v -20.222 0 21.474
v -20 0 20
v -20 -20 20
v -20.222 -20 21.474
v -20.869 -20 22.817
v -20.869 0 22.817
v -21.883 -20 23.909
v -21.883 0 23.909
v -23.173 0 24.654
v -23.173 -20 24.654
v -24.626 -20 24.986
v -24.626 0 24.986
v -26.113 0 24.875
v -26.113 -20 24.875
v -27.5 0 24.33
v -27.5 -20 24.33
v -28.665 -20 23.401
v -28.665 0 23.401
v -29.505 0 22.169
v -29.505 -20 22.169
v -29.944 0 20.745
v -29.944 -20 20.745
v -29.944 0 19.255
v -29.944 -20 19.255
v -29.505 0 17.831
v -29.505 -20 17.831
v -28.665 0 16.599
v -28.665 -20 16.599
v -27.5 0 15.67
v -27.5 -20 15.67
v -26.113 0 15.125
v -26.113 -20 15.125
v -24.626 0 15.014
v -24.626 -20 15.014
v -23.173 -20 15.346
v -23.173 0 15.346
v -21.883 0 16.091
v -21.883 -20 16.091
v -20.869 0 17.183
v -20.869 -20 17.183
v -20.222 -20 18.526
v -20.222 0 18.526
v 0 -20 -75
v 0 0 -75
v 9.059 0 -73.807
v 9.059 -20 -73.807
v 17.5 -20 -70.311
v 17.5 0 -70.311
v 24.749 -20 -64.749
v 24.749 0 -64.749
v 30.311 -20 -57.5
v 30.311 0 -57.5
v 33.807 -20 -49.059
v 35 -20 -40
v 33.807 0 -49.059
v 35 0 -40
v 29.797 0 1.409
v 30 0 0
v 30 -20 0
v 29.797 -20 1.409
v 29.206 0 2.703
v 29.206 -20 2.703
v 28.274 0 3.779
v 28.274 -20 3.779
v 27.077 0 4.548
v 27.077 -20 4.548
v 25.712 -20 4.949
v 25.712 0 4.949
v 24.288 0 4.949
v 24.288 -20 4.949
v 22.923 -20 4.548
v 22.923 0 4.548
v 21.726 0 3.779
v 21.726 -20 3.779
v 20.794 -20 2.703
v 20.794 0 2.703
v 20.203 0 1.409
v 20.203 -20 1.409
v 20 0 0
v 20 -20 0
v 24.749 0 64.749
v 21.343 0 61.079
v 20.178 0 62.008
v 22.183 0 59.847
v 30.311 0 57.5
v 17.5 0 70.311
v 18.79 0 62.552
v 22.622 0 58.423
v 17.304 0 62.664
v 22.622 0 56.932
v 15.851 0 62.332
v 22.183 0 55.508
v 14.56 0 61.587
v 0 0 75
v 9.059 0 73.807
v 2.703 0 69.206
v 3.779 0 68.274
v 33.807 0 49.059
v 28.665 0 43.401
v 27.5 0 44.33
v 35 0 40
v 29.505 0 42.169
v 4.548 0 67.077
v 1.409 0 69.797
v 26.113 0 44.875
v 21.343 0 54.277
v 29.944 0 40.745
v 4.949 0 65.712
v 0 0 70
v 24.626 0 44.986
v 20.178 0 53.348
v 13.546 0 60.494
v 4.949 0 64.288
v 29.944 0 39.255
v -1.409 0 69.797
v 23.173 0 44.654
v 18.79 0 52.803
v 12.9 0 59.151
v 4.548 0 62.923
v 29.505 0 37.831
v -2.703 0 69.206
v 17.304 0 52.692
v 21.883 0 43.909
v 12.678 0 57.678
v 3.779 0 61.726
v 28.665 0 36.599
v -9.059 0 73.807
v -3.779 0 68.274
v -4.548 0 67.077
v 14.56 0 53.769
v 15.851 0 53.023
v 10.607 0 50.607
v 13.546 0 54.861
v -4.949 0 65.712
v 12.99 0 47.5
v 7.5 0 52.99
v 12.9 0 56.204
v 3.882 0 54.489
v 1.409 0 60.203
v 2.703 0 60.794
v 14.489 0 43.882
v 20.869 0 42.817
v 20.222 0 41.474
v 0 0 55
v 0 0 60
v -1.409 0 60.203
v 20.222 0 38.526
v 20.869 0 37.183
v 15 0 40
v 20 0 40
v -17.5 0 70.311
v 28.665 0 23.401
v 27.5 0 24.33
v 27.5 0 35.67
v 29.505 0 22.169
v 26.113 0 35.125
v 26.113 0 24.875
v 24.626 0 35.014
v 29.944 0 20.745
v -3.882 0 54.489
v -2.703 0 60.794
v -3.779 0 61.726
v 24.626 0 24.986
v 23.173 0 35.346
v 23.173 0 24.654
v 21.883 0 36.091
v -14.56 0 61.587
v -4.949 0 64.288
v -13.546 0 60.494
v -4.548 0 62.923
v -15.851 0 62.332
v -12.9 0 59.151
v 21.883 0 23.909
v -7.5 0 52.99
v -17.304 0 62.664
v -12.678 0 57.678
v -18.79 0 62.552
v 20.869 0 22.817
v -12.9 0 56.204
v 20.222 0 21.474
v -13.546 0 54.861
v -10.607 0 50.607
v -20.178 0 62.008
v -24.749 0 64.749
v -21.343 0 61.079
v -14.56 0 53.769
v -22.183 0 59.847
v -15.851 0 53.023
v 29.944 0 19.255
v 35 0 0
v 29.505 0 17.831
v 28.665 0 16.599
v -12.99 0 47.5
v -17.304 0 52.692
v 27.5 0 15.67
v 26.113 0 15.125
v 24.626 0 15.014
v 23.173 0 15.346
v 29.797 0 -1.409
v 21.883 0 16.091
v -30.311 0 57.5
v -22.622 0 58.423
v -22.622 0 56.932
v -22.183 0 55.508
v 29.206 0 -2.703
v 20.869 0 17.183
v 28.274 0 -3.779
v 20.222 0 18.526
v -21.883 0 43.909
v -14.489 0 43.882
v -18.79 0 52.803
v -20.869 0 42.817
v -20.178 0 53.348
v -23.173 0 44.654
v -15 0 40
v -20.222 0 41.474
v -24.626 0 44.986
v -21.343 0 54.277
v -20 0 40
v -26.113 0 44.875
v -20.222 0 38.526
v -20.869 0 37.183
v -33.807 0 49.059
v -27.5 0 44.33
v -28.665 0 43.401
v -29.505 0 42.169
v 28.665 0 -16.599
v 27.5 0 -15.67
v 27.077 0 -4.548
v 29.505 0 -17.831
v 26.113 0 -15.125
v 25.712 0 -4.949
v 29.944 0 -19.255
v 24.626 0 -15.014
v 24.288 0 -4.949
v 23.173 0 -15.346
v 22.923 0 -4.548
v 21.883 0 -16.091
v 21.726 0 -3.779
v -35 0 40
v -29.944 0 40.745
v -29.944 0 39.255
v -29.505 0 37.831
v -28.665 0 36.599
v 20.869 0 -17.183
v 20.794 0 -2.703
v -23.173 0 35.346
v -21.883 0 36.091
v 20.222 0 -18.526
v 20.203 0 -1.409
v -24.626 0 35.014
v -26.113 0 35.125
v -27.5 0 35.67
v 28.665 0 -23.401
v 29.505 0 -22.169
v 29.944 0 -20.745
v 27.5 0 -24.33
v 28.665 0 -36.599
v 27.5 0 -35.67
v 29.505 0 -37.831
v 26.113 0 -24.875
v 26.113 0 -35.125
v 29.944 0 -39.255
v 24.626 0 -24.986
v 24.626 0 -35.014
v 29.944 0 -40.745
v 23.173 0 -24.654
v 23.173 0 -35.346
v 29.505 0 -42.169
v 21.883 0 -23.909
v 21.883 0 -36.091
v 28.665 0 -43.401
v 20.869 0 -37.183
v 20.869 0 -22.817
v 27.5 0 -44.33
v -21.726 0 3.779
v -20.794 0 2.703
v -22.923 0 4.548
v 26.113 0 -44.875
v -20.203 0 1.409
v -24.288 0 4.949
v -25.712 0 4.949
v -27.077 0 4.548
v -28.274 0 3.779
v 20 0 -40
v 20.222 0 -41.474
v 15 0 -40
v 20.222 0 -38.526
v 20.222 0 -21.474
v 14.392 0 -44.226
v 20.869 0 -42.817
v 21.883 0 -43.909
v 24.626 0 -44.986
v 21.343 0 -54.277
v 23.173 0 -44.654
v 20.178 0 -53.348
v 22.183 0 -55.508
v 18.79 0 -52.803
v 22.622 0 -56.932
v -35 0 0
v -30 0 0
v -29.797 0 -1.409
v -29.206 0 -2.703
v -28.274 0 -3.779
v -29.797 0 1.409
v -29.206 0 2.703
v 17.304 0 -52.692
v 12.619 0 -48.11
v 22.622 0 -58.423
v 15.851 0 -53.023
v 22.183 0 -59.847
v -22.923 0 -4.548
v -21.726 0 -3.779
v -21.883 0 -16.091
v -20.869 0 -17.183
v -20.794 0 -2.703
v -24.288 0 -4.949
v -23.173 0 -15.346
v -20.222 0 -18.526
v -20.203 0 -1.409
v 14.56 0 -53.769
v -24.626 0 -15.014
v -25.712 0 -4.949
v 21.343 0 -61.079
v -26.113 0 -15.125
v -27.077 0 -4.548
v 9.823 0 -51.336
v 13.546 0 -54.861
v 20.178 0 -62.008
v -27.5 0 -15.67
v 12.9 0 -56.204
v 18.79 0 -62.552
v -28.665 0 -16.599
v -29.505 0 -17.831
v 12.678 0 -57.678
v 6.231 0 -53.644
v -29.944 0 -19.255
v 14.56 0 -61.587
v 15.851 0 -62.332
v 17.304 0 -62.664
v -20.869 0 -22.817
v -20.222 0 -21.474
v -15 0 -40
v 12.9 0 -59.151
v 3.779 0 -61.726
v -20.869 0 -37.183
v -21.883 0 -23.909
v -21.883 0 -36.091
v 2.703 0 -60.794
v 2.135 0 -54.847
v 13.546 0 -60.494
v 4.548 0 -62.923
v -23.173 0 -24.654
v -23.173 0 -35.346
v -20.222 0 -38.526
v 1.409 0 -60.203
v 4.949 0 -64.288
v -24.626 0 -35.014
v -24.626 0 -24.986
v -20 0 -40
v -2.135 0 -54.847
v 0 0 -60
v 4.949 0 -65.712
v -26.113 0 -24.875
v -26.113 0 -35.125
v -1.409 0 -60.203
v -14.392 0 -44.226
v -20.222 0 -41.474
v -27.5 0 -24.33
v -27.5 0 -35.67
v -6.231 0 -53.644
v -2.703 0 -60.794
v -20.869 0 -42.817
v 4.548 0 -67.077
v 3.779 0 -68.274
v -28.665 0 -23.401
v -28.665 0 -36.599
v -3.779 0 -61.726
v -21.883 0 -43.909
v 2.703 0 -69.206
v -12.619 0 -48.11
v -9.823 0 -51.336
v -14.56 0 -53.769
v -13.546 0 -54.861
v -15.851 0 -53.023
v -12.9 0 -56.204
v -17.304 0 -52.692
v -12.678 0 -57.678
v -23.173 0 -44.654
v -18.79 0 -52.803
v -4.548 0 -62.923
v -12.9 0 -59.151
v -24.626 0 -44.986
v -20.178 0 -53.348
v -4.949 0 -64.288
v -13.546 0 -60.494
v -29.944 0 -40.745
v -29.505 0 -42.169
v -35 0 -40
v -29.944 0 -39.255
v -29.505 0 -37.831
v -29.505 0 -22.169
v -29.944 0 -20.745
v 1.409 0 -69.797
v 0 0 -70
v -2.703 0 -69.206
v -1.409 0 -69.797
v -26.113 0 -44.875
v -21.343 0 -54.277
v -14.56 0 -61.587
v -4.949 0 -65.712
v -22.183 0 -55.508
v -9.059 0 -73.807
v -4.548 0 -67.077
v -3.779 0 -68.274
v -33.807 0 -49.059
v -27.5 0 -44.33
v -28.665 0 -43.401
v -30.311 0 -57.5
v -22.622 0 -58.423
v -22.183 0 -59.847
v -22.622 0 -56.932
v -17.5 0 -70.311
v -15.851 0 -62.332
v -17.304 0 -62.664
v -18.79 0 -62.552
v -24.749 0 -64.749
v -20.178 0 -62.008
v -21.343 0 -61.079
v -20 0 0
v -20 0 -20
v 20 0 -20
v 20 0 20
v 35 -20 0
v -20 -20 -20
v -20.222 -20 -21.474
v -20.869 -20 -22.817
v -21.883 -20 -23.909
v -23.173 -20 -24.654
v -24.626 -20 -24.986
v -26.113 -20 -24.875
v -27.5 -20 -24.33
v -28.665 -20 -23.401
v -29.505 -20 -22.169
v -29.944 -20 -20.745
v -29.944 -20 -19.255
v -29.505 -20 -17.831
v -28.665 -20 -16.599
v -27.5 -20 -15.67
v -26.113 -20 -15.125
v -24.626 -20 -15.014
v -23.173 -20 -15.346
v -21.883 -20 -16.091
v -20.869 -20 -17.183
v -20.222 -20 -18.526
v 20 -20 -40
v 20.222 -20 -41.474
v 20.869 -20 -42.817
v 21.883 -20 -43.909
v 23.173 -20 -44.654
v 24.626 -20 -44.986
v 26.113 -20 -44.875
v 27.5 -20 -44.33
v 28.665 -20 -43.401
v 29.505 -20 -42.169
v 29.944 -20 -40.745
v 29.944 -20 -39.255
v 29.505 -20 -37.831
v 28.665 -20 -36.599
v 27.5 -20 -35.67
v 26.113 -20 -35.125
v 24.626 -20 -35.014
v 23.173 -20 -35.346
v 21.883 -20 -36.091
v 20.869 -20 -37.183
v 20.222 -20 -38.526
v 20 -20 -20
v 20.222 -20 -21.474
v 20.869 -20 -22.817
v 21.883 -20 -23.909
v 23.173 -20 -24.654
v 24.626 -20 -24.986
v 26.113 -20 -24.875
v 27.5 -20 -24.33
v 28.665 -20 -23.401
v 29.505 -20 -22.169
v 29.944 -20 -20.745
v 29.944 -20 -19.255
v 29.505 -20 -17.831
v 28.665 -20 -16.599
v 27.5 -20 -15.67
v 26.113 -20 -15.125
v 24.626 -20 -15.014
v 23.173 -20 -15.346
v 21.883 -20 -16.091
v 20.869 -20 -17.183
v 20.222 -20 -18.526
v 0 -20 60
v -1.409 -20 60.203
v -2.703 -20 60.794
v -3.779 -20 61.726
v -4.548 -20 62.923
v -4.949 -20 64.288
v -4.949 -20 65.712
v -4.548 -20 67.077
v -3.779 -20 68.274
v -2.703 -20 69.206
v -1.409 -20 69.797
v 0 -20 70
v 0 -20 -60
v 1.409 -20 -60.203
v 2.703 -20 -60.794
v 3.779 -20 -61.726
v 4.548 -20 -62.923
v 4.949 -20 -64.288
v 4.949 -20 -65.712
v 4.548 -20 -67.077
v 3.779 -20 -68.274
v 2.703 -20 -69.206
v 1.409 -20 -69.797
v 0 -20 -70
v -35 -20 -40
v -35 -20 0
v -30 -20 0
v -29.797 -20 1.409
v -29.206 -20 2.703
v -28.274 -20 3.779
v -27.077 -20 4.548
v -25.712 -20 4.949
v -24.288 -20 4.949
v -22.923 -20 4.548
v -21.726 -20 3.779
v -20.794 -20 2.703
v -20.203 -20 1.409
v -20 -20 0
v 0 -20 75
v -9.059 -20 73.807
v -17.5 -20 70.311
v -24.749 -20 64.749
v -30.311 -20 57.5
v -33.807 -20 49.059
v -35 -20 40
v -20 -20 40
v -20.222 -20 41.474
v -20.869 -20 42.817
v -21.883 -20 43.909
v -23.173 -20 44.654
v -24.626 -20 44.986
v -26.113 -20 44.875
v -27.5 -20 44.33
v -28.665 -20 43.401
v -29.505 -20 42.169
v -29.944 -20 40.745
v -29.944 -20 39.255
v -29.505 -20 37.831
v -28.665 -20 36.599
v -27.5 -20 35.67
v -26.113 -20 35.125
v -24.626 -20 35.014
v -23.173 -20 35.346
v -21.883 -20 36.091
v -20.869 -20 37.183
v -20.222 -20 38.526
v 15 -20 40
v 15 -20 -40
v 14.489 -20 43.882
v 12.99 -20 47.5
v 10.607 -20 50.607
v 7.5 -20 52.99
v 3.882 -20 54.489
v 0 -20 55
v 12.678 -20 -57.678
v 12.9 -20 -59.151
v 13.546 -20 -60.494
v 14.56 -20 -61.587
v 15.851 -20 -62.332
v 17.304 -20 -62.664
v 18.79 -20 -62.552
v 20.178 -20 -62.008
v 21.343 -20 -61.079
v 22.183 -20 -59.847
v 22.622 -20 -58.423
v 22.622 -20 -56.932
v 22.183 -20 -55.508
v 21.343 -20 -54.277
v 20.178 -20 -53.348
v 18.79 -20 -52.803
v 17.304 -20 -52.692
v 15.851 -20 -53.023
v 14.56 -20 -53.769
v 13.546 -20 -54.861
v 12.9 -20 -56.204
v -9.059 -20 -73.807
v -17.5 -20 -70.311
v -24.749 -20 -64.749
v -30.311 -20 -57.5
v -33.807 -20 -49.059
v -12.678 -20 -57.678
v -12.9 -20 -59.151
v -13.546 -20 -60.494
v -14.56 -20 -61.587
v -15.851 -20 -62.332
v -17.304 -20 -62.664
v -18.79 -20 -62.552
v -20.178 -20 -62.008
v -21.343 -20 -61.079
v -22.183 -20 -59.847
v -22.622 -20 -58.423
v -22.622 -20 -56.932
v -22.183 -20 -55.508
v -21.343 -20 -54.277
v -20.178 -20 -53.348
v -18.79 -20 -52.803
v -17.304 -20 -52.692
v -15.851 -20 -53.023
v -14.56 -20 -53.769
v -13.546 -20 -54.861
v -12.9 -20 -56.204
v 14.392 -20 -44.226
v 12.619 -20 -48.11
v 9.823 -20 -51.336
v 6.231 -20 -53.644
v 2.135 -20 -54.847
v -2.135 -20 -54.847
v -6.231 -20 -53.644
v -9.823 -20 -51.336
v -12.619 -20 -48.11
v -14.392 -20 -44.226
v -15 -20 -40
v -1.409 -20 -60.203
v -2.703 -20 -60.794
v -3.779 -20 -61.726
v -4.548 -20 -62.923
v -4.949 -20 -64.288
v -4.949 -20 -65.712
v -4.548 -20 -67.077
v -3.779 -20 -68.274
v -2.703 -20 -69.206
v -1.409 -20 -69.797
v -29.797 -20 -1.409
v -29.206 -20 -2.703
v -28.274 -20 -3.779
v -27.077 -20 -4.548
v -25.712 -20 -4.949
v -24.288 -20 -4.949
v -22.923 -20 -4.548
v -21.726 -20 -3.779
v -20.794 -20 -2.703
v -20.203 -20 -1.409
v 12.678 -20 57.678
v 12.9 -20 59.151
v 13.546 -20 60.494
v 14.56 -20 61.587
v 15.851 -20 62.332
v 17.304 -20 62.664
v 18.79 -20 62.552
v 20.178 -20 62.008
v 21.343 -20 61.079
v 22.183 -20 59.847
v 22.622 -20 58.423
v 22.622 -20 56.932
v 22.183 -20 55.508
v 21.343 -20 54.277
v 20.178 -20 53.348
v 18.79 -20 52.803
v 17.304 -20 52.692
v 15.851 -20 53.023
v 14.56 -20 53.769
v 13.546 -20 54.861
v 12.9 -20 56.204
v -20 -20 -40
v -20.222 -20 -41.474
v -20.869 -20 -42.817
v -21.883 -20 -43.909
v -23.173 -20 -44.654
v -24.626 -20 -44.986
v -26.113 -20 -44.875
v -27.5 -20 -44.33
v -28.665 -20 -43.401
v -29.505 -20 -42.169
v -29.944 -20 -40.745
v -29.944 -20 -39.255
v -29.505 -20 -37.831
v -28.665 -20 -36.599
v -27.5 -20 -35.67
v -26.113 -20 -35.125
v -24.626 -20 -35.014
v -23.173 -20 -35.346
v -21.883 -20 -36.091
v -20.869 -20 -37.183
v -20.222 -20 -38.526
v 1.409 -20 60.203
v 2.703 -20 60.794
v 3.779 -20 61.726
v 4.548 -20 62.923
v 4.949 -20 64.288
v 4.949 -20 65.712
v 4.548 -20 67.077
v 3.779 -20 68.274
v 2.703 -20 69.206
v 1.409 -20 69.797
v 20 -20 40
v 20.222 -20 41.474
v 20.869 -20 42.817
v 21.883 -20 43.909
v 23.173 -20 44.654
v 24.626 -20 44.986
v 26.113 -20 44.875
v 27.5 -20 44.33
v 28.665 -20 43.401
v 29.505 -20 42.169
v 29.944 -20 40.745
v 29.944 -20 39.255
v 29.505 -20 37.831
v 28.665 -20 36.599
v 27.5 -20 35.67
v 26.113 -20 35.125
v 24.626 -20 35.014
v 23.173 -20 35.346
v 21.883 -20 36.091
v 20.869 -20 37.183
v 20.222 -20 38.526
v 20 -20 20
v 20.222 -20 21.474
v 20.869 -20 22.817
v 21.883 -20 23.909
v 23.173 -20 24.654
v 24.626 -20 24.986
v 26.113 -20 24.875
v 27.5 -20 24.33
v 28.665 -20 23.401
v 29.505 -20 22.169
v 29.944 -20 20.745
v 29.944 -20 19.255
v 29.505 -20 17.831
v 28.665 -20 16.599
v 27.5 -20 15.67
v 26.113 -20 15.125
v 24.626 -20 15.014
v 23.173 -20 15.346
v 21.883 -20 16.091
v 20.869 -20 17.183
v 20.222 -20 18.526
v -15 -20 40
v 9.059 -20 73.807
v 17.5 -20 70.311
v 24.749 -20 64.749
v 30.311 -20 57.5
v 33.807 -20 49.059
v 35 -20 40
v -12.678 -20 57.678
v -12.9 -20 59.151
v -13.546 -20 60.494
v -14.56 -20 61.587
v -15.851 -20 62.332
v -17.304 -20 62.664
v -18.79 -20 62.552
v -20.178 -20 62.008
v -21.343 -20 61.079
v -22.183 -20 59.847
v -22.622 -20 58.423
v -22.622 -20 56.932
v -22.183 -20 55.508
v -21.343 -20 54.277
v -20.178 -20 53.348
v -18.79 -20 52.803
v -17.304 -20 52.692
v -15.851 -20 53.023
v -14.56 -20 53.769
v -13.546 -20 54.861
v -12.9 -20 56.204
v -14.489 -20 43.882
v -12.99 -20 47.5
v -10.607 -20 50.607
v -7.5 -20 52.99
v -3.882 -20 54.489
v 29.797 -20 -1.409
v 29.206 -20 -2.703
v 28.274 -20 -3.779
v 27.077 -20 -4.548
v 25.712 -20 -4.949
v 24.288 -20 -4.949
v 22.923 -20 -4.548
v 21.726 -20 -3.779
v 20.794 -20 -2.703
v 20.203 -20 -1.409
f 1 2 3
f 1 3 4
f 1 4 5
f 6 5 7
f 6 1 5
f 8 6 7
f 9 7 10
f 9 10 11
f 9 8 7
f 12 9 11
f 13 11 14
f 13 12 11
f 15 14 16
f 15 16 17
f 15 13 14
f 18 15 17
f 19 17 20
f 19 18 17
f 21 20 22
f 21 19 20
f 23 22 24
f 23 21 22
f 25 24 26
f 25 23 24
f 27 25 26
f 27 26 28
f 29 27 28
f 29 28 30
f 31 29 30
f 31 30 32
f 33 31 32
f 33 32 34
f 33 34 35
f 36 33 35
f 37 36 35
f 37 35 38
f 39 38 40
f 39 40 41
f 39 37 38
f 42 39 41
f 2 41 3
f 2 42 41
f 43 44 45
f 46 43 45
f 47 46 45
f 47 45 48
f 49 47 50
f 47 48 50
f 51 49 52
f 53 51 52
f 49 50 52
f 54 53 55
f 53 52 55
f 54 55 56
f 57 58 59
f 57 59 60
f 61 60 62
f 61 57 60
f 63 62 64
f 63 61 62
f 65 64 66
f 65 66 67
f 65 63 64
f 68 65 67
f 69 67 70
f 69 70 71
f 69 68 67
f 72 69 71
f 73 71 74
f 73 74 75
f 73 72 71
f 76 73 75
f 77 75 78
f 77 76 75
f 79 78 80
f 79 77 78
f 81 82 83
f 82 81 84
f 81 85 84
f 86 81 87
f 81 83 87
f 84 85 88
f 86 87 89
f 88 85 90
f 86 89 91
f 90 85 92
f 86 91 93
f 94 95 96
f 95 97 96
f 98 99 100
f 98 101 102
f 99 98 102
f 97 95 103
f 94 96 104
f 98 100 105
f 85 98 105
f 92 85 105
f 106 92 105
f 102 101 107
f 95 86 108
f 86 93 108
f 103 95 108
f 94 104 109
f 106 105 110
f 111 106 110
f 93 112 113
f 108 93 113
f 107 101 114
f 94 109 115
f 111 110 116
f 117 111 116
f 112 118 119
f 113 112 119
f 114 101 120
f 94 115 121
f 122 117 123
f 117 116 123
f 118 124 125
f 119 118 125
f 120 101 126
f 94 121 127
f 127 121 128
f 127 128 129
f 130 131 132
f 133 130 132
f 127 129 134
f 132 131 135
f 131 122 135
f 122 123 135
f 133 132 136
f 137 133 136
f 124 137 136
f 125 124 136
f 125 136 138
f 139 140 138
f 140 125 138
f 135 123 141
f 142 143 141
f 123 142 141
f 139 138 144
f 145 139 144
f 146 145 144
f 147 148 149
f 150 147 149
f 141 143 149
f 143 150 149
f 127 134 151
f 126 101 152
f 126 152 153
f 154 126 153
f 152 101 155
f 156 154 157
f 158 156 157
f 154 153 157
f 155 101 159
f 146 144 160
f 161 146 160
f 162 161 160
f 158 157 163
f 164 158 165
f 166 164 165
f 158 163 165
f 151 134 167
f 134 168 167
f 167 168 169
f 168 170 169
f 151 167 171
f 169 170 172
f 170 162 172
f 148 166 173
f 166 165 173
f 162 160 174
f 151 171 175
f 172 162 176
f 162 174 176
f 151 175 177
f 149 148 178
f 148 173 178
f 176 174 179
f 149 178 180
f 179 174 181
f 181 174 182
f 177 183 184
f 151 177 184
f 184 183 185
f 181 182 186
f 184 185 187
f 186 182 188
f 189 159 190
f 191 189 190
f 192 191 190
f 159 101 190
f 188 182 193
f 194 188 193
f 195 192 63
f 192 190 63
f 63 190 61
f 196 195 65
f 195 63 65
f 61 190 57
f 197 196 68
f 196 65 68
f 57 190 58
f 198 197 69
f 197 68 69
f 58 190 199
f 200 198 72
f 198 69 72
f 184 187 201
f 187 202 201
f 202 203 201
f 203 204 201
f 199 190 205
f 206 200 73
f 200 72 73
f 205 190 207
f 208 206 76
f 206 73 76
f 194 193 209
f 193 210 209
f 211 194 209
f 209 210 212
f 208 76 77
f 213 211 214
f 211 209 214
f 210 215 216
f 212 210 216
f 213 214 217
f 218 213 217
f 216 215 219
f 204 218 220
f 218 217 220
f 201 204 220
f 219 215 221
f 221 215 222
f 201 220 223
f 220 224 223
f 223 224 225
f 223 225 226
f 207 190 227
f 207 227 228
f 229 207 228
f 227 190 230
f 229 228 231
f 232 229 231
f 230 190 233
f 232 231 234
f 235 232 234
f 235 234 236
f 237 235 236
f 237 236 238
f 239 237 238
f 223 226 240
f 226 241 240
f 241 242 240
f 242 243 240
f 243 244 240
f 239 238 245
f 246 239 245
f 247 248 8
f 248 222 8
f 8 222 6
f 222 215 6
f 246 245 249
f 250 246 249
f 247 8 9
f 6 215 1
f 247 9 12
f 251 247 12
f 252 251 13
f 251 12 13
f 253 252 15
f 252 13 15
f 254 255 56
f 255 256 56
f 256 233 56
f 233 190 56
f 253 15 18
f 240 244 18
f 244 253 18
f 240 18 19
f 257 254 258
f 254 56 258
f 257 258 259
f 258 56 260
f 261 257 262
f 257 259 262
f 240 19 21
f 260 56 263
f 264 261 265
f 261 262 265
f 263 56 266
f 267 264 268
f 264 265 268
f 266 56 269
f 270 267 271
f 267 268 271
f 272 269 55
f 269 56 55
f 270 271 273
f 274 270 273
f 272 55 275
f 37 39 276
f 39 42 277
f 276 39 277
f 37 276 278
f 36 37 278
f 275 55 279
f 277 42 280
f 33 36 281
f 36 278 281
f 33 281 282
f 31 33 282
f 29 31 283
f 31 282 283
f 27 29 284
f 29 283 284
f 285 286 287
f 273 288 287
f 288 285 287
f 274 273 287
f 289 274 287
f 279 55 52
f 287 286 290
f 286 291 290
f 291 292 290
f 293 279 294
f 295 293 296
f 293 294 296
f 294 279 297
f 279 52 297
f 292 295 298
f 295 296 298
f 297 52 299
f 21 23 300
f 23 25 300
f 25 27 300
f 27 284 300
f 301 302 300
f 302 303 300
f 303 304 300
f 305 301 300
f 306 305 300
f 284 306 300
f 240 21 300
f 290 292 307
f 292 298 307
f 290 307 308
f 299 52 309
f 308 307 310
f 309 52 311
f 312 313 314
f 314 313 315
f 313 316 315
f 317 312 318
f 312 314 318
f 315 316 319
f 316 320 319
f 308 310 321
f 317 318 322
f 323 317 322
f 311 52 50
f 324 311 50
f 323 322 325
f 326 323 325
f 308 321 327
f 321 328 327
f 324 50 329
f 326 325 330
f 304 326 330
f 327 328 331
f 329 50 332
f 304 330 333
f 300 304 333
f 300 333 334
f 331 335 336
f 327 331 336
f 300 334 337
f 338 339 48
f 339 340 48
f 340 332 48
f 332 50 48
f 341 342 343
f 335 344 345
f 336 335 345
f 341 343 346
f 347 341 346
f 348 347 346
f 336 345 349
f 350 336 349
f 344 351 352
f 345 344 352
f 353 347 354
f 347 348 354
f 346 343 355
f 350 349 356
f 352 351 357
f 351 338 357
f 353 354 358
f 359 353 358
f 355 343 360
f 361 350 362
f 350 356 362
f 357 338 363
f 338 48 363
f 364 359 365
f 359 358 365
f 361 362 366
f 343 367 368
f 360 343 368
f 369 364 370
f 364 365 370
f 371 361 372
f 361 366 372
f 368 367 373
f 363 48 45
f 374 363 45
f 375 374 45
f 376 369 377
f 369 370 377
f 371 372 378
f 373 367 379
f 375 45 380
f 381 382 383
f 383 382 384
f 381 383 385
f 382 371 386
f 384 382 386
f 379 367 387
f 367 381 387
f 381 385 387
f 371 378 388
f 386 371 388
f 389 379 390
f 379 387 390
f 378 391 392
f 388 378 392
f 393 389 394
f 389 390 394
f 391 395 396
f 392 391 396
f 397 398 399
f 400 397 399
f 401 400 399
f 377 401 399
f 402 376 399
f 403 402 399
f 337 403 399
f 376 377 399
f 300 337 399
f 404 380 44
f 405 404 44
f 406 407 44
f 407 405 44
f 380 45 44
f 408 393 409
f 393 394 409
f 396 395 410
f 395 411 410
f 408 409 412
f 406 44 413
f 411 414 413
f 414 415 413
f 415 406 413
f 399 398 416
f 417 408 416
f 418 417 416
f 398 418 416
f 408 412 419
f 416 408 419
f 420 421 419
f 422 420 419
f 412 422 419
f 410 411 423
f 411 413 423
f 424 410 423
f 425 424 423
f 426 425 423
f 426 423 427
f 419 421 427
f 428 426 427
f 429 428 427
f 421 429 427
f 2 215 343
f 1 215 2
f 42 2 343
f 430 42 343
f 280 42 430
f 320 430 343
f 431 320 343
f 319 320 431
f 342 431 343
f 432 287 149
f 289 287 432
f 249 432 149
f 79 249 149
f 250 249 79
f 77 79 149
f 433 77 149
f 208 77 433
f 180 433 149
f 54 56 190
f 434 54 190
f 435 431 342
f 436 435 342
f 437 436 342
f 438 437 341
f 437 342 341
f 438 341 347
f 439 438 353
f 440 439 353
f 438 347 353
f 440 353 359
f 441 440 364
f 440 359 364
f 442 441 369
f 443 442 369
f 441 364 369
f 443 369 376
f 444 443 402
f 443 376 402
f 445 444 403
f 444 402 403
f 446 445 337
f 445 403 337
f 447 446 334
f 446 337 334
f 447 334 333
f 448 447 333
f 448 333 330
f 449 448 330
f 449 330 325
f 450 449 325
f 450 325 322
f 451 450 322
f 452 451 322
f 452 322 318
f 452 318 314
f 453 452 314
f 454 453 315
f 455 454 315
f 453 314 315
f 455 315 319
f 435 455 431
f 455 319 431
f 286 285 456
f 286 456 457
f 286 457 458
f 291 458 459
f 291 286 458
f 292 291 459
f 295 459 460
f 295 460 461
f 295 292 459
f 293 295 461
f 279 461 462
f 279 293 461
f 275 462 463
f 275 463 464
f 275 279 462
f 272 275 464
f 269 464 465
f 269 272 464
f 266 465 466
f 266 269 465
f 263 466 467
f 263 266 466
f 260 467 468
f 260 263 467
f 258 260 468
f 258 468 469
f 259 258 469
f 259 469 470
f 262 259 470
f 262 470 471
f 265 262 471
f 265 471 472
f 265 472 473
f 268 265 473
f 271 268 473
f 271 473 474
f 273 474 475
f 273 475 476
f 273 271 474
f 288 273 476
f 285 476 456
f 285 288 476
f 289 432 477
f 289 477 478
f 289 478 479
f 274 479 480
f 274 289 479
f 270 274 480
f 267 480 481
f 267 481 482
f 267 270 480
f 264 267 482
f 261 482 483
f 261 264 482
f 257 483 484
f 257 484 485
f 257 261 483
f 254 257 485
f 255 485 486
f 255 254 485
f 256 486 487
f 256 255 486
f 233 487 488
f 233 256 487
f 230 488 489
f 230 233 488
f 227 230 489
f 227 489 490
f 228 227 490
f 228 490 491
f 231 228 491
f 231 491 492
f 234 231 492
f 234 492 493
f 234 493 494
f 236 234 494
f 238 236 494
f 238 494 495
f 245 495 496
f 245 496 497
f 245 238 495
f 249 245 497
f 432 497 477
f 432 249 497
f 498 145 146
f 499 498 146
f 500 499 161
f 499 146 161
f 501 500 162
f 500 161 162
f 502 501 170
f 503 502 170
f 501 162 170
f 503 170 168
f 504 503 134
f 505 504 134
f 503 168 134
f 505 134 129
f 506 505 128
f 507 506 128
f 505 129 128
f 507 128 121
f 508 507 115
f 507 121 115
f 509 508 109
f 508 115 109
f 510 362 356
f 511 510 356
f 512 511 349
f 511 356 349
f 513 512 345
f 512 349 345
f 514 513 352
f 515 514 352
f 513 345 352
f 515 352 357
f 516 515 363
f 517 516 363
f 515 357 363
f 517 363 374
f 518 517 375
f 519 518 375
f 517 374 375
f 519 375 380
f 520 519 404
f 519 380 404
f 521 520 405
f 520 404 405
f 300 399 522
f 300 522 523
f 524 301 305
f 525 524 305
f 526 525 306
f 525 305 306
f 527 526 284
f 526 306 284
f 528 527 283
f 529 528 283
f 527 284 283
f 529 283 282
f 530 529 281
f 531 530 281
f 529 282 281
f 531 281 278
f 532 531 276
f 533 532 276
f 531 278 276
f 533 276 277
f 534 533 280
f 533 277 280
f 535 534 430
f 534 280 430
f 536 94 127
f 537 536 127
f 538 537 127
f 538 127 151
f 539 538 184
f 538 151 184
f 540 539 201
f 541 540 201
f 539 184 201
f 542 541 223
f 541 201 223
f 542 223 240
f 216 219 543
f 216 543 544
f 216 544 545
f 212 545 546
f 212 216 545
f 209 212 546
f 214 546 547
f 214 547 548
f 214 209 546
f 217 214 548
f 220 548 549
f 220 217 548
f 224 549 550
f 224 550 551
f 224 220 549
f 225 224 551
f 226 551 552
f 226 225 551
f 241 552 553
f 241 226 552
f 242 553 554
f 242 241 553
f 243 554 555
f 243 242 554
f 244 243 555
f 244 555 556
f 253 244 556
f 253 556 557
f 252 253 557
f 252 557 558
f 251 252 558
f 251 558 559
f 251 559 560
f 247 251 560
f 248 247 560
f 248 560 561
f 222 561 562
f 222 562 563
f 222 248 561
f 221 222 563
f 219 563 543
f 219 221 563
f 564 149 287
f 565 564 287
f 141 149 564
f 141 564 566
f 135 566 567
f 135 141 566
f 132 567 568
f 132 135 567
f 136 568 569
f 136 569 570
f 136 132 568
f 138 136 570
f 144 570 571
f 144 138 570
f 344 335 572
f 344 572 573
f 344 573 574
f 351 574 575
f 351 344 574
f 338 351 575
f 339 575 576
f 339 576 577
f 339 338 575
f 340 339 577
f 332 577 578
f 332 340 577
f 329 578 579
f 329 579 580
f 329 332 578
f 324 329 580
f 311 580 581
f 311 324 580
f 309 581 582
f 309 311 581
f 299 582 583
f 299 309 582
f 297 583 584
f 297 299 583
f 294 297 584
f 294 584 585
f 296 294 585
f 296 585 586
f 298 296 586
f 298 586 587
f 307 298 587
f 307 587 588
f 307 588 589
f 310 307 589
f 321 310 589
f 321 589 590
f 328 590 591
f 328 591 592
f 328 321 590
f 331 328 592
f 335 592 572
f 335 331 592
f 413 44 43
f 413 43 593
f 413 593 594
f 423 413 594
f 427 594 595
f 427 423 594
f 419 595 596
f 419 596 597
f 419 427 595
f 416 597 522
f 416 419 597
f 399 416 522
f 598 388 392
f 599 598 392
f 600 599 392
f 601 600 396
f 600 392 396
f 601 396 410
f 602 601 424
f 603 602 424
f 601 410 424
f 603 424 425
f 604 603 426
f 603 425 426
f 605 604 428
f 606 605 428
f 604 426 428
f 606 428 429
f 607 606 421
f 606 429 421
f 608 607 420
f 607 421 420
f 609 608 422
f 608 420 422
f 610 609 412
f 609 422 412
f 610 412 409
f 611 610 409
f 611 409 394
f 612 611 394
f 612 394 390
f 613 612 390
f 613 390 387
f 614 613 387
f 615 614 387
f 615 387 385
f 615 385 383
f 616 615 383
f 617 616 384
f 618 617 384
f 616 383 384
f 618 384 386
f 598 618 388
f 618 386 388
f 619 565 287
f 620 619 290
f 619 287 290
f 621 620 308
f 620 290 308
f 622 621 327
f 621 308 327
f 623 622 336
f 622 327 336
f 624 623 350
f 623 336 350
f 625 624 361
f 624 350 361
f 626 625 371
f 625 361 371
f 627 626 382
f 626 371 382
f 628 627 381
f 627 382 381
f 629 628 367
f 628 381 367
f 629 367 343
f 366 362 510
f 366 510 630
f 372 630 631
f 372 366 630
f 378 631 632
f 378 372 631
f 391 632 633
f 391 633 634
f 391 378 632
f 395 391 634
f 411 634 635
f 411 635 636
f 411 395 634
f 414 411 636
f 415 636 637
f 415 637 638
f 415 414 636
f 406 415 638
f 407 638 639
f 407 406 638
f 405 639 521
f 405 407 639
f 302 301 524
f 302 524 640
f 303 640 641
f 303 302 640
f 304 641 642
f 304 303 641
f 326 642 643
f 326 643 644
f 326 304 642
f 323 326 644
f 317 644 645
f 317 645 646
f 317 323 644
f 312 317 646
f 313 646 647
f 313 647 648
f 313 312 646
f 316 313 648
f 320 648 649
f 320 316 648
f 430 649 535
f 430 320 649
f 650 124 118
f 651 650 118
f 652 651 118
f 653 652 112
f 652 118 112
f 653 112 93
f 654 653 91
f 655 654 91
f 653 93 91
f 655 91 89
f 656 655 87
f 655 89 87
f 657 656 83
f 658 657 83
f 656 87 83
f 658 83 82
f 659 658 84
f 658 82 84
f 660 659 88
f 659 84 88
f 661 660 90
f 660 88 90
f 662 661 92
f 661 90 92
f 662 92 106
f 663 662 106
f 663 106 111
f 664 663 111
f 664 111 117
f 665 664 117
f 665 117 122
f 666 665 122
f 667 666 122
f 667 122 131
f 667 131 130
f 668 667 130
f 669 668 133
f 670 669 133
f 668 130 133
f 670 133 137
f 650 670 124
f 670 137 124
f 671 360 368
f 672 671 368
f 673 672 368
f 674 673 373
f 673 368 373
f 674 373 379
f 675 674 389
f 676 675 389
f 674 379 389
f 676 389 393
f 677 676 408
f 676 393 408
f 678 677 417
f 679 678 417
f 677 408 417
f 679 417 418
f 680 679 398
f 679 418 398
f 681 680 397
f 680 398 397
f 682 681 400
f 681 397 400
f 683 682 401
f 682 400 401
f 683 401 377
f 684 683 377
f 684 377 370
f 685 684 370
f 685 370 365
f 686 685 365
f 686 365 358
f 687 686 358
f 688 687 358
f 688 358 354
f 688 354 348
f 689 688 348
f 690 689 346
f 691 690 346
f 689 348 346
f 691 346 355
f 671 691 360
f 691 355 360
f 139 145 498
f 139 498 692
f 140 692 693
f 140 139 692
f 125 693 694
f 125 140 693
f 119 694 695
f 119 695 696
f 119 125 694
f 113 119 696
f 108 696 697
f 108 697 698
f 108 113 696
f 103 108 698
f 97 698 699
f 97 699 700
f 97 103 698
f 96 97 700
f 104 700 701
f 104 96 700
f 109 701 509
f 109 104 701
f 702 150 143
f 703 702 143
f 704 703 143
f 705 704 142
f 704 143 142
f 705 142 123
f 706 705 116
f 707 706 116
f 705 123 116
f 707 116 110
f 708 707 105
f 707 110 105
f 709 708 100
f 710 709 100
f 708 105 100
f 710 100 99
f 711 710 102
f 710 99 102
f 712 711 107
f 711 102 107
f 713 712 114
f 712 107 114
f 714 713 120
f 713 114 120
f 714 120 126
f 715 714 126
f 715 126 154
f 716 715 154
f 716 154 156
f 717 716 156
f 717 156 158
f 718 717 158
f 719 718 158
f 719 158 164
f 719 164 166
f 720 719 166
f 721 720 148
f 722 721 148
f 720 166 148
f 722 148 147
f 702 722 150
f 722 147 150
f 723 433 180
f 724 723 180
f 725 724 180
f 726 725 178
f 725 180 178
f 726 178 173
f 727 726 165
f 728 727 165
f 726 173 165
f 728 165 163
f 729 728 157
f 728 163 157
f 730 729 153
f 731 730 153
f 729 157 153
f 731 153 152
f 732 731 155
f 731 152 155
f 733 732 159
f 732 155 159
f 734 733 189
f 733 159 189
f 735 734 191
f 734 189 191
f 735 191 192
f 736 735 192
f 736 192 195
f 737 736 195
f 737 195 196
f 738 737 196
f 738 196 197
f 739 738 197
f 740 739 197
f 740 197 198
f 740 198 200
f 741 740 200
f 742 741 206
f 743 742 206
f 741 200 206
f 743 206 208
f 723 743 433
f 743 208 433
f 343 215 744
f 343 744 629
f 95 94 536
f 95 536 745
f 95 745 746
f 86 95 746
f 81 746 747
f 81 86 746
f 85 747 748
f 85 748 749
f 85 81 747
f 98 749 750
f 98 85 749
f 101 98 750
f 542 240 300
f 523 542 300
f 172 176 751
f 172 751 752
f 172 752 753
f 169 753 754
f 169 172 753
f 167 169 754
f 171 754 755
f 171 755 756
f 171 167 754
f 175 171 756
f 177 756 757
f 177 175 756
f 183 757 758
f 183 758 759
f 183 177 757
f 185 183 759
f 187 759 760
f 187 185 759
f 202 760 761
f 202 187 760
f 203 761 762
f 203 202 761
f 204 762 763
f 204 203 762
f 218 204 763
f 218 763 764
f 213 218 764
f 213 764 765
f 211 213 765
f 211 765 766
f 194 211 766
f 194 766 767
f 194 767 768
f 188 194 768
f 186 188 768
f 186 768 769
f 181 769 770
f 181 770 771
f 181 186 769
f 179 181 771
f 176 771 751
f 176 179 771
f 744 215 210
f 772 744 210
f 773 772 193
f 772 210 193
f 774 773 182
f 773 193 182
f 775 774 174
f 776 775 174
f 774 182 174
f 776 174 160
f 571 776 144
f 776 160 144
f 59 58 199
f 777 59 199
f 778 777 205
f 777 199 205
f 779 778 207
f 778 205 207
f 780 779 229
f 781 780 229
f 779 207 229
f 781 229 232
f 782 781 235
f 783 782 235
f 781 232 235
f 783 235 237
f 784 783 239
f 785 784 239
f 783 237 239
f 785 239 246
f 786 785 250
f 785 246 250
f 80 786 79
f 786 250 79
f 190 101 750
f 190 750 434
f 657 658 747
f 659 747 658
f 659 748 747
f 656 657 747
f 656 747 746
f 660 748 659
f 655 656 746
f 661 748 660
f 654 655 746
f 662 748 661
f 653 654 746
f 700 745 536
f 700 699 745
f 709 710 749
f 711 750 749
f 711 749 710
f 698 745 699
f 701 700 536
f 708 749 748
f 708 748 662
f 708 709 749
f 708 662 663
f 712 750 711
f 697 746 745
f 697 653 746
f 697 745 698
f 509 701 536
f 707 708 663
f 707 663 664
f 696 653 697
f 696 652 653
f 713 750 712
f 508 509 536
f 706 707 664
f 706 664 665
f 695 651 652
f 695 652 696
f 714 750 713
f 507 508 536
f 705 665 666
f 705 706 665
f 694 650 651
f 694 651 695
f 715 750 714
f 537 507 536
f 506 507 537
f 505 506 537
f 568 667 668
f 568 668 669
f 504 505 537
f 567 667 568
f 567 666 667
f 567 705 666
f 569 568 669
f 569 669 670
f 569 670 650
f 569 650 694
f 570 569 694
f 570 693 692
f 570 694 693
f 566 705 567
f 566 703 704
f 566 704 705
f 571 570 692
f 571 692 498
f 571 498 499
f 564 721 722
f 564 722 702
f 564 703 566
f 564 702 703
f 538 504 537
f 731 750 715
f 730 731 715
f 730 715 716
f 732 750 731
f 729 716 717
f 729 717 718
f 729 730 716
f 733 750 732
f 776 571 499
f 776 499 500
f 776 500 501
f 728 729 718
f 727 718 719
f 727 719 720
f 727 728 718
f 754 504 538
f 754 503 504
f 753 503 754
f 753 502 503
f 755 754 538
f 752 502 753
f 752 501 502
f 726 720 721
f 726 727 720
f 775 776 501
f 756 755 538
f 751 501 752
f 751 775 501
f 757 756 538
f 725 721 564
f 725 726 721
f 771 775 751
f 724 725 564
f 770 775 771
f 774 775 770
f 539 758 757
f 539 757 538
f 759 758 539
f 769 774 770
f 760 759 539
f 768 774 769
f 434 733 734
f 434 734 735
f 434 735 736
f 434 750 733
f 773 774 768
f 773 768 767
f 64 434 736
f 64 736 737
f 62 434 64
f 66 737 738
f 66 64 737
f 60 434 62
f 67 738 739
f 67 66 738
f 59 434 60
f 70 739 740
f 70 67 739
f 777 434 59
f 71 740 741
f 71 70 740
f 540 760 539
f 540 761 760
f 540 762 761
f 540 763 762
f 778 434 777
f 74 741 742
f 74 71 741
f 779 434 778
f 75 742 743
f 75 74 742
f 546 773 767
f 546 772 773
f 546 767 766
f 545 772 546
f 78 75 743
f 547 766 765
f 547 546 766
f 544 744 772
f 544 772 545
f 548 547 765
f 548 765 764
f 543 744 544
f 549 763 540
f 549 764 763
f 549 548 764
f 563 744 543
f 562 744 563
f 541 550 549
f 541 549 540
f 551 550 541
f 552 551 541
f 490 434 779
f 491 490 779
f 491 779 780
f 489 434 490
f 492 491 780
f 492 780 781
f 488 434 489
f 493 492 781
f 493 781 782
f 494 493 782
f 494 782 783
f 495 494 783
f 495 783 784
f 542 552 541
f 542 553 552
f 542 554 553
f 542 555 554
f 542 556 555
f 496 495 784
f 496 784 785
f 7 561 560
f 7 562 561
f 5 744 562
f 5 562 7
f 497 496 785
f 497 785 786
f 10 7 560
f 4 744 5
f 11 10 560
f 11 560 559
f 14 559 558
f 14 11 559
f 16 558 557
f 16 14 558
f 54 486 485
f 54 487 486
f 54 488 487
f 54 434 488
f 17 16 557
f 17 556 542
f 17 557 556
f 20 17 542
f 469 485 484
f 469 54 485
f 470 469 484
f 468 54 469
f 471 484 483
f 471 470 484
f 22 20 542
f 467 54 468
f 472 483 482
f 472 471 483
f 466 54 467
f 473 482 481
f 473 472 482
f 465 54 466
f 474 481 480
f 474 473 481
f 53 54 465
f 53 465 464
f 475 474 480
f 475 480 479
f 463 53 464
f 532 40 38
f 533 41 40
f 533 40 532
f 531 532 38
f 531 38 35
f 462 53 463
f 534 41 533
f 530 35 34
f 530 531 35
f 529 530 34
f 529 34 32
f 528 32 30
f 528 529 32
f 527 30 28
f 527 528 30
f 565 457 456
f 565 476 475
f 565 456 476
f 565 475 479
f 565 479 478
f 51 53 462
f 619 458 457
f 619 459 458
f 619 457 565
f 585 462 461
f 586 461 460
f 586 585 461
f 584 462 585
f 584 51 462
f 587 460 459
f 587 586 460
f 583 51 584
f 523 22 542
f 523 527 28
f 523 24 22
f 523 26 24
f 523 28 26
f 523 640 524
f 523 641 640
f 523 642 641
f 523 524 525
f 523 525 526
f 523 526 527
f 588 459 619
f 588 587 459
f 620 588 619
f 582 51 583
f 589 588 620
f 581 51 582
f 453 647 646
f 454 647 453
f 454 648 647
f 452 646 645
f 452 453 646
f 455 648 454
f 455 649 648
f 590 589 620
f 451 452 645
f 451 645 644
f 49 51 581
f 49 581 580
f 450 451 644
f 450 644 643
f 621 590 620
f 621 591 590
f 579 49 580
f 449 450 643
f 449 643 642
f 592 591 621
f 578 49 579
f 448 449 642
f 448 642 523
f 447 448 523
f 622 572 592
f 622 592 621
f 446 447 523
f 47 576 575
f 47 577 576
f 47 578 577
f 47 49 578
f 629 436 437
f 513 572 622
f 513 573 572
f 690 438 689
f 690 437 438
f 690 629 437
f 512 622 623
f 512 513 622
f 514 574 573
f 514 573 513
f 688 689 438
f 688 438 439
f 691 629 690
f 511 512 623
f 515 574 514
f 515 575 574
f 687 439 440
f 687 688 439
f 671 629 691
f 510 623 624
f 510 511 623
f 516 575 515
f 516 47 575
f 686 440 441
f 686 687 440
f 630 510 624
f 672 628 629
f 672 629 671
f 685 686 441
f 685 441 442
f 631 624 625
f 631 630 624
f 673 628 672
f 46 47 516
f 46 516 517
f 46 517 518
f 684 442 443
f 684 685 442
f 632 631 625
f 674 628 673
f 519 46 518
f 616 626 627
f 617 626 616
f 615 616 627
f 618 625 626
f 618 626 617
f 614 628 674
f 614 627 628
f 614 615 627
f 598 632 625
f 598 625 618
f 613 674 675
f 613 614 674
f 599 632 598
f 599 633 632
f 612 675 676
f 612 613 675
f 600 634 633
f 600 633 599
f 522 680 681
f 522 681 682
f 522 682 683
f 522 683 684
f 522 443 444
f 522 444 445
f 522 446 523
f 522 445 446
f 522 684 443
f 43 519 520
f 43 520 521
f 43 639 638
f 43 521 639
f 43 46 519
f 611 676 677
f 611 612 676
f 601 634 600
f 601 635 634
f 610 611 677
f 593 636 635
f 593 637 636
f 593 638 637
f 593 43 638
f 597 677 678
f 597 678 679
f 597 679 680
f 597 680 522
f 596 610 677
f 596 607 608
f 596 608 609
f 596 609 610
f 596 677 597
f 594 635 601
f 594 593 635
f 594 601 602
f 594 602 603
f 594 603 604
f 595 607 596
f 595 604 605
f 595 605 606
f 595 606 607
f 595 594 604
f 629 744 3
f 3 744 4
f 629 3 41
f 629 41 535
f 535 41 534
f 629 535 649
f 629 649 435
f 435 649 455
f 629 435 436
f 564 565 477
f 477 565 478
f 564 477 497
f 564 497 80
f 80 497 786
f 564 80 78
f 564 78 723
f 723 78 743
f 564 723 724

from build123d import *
from build123d import SkipClean  # not in build123d's __all__

# Parameters (mm, degrees)
F0_R     = 5
F1_DEPTH = 20


with BuildPart() as f1:
    # F0 (on Front) → F1 (new body)
    with BuildSketch(Plane.XZ):
        with BuildLine():
            ThreePointArc((-15, 40), (-10.6066017178, 50.6066017178), (0, 55))
            Line((0, 55), (0, 60))
            ThreePointArc((0, 60), (-5, 65), (0, 70))
            Line((0, 70), (0, 75))
            ThreePointArc((0, 75), (-24.7487373415, 64.7487373415), (-35, 40))
            Line((-35, 40), (-35, 0))
            Line((-35, 0), (-30, 0))
            ThreePointArc((-30, 0), (-25, 5), (-20, 0))
            Line((-20, 0), (-15, 0))
            Line((-15, 0), (-15, 40))
        make_face()
        with Locations((-25, 20)):
            Circle(F0_R, mode=Mode.SUBTRACT)
        with Locations((-25, 40)):
            Circle(F0_R, mode=Mode.SUBTRACT)
        with Locations((-17.6776695297, 57.6776695297)):
            Circle(F0_R, mode=Mode.SUBTRACT)
    extrude(amount=F1_DEPTH)

    # F2: F1 across plane


with BuildPart() as f1_1:
    add(f1.part, clean=False)
    with SkipClean():  # cleaning this boolean's faces spoils the solid; the shape is the same uncleaned
        add(f1.part.mirror(Plane.YZ), clean=False)

    # F3: F1 across plane


with BuildPart() as f1_2:
    add(f1_1.part, clean=False)
    add(f1_1.part.mirror(Plane.XY), clean=False)


solid = f1_2.part
